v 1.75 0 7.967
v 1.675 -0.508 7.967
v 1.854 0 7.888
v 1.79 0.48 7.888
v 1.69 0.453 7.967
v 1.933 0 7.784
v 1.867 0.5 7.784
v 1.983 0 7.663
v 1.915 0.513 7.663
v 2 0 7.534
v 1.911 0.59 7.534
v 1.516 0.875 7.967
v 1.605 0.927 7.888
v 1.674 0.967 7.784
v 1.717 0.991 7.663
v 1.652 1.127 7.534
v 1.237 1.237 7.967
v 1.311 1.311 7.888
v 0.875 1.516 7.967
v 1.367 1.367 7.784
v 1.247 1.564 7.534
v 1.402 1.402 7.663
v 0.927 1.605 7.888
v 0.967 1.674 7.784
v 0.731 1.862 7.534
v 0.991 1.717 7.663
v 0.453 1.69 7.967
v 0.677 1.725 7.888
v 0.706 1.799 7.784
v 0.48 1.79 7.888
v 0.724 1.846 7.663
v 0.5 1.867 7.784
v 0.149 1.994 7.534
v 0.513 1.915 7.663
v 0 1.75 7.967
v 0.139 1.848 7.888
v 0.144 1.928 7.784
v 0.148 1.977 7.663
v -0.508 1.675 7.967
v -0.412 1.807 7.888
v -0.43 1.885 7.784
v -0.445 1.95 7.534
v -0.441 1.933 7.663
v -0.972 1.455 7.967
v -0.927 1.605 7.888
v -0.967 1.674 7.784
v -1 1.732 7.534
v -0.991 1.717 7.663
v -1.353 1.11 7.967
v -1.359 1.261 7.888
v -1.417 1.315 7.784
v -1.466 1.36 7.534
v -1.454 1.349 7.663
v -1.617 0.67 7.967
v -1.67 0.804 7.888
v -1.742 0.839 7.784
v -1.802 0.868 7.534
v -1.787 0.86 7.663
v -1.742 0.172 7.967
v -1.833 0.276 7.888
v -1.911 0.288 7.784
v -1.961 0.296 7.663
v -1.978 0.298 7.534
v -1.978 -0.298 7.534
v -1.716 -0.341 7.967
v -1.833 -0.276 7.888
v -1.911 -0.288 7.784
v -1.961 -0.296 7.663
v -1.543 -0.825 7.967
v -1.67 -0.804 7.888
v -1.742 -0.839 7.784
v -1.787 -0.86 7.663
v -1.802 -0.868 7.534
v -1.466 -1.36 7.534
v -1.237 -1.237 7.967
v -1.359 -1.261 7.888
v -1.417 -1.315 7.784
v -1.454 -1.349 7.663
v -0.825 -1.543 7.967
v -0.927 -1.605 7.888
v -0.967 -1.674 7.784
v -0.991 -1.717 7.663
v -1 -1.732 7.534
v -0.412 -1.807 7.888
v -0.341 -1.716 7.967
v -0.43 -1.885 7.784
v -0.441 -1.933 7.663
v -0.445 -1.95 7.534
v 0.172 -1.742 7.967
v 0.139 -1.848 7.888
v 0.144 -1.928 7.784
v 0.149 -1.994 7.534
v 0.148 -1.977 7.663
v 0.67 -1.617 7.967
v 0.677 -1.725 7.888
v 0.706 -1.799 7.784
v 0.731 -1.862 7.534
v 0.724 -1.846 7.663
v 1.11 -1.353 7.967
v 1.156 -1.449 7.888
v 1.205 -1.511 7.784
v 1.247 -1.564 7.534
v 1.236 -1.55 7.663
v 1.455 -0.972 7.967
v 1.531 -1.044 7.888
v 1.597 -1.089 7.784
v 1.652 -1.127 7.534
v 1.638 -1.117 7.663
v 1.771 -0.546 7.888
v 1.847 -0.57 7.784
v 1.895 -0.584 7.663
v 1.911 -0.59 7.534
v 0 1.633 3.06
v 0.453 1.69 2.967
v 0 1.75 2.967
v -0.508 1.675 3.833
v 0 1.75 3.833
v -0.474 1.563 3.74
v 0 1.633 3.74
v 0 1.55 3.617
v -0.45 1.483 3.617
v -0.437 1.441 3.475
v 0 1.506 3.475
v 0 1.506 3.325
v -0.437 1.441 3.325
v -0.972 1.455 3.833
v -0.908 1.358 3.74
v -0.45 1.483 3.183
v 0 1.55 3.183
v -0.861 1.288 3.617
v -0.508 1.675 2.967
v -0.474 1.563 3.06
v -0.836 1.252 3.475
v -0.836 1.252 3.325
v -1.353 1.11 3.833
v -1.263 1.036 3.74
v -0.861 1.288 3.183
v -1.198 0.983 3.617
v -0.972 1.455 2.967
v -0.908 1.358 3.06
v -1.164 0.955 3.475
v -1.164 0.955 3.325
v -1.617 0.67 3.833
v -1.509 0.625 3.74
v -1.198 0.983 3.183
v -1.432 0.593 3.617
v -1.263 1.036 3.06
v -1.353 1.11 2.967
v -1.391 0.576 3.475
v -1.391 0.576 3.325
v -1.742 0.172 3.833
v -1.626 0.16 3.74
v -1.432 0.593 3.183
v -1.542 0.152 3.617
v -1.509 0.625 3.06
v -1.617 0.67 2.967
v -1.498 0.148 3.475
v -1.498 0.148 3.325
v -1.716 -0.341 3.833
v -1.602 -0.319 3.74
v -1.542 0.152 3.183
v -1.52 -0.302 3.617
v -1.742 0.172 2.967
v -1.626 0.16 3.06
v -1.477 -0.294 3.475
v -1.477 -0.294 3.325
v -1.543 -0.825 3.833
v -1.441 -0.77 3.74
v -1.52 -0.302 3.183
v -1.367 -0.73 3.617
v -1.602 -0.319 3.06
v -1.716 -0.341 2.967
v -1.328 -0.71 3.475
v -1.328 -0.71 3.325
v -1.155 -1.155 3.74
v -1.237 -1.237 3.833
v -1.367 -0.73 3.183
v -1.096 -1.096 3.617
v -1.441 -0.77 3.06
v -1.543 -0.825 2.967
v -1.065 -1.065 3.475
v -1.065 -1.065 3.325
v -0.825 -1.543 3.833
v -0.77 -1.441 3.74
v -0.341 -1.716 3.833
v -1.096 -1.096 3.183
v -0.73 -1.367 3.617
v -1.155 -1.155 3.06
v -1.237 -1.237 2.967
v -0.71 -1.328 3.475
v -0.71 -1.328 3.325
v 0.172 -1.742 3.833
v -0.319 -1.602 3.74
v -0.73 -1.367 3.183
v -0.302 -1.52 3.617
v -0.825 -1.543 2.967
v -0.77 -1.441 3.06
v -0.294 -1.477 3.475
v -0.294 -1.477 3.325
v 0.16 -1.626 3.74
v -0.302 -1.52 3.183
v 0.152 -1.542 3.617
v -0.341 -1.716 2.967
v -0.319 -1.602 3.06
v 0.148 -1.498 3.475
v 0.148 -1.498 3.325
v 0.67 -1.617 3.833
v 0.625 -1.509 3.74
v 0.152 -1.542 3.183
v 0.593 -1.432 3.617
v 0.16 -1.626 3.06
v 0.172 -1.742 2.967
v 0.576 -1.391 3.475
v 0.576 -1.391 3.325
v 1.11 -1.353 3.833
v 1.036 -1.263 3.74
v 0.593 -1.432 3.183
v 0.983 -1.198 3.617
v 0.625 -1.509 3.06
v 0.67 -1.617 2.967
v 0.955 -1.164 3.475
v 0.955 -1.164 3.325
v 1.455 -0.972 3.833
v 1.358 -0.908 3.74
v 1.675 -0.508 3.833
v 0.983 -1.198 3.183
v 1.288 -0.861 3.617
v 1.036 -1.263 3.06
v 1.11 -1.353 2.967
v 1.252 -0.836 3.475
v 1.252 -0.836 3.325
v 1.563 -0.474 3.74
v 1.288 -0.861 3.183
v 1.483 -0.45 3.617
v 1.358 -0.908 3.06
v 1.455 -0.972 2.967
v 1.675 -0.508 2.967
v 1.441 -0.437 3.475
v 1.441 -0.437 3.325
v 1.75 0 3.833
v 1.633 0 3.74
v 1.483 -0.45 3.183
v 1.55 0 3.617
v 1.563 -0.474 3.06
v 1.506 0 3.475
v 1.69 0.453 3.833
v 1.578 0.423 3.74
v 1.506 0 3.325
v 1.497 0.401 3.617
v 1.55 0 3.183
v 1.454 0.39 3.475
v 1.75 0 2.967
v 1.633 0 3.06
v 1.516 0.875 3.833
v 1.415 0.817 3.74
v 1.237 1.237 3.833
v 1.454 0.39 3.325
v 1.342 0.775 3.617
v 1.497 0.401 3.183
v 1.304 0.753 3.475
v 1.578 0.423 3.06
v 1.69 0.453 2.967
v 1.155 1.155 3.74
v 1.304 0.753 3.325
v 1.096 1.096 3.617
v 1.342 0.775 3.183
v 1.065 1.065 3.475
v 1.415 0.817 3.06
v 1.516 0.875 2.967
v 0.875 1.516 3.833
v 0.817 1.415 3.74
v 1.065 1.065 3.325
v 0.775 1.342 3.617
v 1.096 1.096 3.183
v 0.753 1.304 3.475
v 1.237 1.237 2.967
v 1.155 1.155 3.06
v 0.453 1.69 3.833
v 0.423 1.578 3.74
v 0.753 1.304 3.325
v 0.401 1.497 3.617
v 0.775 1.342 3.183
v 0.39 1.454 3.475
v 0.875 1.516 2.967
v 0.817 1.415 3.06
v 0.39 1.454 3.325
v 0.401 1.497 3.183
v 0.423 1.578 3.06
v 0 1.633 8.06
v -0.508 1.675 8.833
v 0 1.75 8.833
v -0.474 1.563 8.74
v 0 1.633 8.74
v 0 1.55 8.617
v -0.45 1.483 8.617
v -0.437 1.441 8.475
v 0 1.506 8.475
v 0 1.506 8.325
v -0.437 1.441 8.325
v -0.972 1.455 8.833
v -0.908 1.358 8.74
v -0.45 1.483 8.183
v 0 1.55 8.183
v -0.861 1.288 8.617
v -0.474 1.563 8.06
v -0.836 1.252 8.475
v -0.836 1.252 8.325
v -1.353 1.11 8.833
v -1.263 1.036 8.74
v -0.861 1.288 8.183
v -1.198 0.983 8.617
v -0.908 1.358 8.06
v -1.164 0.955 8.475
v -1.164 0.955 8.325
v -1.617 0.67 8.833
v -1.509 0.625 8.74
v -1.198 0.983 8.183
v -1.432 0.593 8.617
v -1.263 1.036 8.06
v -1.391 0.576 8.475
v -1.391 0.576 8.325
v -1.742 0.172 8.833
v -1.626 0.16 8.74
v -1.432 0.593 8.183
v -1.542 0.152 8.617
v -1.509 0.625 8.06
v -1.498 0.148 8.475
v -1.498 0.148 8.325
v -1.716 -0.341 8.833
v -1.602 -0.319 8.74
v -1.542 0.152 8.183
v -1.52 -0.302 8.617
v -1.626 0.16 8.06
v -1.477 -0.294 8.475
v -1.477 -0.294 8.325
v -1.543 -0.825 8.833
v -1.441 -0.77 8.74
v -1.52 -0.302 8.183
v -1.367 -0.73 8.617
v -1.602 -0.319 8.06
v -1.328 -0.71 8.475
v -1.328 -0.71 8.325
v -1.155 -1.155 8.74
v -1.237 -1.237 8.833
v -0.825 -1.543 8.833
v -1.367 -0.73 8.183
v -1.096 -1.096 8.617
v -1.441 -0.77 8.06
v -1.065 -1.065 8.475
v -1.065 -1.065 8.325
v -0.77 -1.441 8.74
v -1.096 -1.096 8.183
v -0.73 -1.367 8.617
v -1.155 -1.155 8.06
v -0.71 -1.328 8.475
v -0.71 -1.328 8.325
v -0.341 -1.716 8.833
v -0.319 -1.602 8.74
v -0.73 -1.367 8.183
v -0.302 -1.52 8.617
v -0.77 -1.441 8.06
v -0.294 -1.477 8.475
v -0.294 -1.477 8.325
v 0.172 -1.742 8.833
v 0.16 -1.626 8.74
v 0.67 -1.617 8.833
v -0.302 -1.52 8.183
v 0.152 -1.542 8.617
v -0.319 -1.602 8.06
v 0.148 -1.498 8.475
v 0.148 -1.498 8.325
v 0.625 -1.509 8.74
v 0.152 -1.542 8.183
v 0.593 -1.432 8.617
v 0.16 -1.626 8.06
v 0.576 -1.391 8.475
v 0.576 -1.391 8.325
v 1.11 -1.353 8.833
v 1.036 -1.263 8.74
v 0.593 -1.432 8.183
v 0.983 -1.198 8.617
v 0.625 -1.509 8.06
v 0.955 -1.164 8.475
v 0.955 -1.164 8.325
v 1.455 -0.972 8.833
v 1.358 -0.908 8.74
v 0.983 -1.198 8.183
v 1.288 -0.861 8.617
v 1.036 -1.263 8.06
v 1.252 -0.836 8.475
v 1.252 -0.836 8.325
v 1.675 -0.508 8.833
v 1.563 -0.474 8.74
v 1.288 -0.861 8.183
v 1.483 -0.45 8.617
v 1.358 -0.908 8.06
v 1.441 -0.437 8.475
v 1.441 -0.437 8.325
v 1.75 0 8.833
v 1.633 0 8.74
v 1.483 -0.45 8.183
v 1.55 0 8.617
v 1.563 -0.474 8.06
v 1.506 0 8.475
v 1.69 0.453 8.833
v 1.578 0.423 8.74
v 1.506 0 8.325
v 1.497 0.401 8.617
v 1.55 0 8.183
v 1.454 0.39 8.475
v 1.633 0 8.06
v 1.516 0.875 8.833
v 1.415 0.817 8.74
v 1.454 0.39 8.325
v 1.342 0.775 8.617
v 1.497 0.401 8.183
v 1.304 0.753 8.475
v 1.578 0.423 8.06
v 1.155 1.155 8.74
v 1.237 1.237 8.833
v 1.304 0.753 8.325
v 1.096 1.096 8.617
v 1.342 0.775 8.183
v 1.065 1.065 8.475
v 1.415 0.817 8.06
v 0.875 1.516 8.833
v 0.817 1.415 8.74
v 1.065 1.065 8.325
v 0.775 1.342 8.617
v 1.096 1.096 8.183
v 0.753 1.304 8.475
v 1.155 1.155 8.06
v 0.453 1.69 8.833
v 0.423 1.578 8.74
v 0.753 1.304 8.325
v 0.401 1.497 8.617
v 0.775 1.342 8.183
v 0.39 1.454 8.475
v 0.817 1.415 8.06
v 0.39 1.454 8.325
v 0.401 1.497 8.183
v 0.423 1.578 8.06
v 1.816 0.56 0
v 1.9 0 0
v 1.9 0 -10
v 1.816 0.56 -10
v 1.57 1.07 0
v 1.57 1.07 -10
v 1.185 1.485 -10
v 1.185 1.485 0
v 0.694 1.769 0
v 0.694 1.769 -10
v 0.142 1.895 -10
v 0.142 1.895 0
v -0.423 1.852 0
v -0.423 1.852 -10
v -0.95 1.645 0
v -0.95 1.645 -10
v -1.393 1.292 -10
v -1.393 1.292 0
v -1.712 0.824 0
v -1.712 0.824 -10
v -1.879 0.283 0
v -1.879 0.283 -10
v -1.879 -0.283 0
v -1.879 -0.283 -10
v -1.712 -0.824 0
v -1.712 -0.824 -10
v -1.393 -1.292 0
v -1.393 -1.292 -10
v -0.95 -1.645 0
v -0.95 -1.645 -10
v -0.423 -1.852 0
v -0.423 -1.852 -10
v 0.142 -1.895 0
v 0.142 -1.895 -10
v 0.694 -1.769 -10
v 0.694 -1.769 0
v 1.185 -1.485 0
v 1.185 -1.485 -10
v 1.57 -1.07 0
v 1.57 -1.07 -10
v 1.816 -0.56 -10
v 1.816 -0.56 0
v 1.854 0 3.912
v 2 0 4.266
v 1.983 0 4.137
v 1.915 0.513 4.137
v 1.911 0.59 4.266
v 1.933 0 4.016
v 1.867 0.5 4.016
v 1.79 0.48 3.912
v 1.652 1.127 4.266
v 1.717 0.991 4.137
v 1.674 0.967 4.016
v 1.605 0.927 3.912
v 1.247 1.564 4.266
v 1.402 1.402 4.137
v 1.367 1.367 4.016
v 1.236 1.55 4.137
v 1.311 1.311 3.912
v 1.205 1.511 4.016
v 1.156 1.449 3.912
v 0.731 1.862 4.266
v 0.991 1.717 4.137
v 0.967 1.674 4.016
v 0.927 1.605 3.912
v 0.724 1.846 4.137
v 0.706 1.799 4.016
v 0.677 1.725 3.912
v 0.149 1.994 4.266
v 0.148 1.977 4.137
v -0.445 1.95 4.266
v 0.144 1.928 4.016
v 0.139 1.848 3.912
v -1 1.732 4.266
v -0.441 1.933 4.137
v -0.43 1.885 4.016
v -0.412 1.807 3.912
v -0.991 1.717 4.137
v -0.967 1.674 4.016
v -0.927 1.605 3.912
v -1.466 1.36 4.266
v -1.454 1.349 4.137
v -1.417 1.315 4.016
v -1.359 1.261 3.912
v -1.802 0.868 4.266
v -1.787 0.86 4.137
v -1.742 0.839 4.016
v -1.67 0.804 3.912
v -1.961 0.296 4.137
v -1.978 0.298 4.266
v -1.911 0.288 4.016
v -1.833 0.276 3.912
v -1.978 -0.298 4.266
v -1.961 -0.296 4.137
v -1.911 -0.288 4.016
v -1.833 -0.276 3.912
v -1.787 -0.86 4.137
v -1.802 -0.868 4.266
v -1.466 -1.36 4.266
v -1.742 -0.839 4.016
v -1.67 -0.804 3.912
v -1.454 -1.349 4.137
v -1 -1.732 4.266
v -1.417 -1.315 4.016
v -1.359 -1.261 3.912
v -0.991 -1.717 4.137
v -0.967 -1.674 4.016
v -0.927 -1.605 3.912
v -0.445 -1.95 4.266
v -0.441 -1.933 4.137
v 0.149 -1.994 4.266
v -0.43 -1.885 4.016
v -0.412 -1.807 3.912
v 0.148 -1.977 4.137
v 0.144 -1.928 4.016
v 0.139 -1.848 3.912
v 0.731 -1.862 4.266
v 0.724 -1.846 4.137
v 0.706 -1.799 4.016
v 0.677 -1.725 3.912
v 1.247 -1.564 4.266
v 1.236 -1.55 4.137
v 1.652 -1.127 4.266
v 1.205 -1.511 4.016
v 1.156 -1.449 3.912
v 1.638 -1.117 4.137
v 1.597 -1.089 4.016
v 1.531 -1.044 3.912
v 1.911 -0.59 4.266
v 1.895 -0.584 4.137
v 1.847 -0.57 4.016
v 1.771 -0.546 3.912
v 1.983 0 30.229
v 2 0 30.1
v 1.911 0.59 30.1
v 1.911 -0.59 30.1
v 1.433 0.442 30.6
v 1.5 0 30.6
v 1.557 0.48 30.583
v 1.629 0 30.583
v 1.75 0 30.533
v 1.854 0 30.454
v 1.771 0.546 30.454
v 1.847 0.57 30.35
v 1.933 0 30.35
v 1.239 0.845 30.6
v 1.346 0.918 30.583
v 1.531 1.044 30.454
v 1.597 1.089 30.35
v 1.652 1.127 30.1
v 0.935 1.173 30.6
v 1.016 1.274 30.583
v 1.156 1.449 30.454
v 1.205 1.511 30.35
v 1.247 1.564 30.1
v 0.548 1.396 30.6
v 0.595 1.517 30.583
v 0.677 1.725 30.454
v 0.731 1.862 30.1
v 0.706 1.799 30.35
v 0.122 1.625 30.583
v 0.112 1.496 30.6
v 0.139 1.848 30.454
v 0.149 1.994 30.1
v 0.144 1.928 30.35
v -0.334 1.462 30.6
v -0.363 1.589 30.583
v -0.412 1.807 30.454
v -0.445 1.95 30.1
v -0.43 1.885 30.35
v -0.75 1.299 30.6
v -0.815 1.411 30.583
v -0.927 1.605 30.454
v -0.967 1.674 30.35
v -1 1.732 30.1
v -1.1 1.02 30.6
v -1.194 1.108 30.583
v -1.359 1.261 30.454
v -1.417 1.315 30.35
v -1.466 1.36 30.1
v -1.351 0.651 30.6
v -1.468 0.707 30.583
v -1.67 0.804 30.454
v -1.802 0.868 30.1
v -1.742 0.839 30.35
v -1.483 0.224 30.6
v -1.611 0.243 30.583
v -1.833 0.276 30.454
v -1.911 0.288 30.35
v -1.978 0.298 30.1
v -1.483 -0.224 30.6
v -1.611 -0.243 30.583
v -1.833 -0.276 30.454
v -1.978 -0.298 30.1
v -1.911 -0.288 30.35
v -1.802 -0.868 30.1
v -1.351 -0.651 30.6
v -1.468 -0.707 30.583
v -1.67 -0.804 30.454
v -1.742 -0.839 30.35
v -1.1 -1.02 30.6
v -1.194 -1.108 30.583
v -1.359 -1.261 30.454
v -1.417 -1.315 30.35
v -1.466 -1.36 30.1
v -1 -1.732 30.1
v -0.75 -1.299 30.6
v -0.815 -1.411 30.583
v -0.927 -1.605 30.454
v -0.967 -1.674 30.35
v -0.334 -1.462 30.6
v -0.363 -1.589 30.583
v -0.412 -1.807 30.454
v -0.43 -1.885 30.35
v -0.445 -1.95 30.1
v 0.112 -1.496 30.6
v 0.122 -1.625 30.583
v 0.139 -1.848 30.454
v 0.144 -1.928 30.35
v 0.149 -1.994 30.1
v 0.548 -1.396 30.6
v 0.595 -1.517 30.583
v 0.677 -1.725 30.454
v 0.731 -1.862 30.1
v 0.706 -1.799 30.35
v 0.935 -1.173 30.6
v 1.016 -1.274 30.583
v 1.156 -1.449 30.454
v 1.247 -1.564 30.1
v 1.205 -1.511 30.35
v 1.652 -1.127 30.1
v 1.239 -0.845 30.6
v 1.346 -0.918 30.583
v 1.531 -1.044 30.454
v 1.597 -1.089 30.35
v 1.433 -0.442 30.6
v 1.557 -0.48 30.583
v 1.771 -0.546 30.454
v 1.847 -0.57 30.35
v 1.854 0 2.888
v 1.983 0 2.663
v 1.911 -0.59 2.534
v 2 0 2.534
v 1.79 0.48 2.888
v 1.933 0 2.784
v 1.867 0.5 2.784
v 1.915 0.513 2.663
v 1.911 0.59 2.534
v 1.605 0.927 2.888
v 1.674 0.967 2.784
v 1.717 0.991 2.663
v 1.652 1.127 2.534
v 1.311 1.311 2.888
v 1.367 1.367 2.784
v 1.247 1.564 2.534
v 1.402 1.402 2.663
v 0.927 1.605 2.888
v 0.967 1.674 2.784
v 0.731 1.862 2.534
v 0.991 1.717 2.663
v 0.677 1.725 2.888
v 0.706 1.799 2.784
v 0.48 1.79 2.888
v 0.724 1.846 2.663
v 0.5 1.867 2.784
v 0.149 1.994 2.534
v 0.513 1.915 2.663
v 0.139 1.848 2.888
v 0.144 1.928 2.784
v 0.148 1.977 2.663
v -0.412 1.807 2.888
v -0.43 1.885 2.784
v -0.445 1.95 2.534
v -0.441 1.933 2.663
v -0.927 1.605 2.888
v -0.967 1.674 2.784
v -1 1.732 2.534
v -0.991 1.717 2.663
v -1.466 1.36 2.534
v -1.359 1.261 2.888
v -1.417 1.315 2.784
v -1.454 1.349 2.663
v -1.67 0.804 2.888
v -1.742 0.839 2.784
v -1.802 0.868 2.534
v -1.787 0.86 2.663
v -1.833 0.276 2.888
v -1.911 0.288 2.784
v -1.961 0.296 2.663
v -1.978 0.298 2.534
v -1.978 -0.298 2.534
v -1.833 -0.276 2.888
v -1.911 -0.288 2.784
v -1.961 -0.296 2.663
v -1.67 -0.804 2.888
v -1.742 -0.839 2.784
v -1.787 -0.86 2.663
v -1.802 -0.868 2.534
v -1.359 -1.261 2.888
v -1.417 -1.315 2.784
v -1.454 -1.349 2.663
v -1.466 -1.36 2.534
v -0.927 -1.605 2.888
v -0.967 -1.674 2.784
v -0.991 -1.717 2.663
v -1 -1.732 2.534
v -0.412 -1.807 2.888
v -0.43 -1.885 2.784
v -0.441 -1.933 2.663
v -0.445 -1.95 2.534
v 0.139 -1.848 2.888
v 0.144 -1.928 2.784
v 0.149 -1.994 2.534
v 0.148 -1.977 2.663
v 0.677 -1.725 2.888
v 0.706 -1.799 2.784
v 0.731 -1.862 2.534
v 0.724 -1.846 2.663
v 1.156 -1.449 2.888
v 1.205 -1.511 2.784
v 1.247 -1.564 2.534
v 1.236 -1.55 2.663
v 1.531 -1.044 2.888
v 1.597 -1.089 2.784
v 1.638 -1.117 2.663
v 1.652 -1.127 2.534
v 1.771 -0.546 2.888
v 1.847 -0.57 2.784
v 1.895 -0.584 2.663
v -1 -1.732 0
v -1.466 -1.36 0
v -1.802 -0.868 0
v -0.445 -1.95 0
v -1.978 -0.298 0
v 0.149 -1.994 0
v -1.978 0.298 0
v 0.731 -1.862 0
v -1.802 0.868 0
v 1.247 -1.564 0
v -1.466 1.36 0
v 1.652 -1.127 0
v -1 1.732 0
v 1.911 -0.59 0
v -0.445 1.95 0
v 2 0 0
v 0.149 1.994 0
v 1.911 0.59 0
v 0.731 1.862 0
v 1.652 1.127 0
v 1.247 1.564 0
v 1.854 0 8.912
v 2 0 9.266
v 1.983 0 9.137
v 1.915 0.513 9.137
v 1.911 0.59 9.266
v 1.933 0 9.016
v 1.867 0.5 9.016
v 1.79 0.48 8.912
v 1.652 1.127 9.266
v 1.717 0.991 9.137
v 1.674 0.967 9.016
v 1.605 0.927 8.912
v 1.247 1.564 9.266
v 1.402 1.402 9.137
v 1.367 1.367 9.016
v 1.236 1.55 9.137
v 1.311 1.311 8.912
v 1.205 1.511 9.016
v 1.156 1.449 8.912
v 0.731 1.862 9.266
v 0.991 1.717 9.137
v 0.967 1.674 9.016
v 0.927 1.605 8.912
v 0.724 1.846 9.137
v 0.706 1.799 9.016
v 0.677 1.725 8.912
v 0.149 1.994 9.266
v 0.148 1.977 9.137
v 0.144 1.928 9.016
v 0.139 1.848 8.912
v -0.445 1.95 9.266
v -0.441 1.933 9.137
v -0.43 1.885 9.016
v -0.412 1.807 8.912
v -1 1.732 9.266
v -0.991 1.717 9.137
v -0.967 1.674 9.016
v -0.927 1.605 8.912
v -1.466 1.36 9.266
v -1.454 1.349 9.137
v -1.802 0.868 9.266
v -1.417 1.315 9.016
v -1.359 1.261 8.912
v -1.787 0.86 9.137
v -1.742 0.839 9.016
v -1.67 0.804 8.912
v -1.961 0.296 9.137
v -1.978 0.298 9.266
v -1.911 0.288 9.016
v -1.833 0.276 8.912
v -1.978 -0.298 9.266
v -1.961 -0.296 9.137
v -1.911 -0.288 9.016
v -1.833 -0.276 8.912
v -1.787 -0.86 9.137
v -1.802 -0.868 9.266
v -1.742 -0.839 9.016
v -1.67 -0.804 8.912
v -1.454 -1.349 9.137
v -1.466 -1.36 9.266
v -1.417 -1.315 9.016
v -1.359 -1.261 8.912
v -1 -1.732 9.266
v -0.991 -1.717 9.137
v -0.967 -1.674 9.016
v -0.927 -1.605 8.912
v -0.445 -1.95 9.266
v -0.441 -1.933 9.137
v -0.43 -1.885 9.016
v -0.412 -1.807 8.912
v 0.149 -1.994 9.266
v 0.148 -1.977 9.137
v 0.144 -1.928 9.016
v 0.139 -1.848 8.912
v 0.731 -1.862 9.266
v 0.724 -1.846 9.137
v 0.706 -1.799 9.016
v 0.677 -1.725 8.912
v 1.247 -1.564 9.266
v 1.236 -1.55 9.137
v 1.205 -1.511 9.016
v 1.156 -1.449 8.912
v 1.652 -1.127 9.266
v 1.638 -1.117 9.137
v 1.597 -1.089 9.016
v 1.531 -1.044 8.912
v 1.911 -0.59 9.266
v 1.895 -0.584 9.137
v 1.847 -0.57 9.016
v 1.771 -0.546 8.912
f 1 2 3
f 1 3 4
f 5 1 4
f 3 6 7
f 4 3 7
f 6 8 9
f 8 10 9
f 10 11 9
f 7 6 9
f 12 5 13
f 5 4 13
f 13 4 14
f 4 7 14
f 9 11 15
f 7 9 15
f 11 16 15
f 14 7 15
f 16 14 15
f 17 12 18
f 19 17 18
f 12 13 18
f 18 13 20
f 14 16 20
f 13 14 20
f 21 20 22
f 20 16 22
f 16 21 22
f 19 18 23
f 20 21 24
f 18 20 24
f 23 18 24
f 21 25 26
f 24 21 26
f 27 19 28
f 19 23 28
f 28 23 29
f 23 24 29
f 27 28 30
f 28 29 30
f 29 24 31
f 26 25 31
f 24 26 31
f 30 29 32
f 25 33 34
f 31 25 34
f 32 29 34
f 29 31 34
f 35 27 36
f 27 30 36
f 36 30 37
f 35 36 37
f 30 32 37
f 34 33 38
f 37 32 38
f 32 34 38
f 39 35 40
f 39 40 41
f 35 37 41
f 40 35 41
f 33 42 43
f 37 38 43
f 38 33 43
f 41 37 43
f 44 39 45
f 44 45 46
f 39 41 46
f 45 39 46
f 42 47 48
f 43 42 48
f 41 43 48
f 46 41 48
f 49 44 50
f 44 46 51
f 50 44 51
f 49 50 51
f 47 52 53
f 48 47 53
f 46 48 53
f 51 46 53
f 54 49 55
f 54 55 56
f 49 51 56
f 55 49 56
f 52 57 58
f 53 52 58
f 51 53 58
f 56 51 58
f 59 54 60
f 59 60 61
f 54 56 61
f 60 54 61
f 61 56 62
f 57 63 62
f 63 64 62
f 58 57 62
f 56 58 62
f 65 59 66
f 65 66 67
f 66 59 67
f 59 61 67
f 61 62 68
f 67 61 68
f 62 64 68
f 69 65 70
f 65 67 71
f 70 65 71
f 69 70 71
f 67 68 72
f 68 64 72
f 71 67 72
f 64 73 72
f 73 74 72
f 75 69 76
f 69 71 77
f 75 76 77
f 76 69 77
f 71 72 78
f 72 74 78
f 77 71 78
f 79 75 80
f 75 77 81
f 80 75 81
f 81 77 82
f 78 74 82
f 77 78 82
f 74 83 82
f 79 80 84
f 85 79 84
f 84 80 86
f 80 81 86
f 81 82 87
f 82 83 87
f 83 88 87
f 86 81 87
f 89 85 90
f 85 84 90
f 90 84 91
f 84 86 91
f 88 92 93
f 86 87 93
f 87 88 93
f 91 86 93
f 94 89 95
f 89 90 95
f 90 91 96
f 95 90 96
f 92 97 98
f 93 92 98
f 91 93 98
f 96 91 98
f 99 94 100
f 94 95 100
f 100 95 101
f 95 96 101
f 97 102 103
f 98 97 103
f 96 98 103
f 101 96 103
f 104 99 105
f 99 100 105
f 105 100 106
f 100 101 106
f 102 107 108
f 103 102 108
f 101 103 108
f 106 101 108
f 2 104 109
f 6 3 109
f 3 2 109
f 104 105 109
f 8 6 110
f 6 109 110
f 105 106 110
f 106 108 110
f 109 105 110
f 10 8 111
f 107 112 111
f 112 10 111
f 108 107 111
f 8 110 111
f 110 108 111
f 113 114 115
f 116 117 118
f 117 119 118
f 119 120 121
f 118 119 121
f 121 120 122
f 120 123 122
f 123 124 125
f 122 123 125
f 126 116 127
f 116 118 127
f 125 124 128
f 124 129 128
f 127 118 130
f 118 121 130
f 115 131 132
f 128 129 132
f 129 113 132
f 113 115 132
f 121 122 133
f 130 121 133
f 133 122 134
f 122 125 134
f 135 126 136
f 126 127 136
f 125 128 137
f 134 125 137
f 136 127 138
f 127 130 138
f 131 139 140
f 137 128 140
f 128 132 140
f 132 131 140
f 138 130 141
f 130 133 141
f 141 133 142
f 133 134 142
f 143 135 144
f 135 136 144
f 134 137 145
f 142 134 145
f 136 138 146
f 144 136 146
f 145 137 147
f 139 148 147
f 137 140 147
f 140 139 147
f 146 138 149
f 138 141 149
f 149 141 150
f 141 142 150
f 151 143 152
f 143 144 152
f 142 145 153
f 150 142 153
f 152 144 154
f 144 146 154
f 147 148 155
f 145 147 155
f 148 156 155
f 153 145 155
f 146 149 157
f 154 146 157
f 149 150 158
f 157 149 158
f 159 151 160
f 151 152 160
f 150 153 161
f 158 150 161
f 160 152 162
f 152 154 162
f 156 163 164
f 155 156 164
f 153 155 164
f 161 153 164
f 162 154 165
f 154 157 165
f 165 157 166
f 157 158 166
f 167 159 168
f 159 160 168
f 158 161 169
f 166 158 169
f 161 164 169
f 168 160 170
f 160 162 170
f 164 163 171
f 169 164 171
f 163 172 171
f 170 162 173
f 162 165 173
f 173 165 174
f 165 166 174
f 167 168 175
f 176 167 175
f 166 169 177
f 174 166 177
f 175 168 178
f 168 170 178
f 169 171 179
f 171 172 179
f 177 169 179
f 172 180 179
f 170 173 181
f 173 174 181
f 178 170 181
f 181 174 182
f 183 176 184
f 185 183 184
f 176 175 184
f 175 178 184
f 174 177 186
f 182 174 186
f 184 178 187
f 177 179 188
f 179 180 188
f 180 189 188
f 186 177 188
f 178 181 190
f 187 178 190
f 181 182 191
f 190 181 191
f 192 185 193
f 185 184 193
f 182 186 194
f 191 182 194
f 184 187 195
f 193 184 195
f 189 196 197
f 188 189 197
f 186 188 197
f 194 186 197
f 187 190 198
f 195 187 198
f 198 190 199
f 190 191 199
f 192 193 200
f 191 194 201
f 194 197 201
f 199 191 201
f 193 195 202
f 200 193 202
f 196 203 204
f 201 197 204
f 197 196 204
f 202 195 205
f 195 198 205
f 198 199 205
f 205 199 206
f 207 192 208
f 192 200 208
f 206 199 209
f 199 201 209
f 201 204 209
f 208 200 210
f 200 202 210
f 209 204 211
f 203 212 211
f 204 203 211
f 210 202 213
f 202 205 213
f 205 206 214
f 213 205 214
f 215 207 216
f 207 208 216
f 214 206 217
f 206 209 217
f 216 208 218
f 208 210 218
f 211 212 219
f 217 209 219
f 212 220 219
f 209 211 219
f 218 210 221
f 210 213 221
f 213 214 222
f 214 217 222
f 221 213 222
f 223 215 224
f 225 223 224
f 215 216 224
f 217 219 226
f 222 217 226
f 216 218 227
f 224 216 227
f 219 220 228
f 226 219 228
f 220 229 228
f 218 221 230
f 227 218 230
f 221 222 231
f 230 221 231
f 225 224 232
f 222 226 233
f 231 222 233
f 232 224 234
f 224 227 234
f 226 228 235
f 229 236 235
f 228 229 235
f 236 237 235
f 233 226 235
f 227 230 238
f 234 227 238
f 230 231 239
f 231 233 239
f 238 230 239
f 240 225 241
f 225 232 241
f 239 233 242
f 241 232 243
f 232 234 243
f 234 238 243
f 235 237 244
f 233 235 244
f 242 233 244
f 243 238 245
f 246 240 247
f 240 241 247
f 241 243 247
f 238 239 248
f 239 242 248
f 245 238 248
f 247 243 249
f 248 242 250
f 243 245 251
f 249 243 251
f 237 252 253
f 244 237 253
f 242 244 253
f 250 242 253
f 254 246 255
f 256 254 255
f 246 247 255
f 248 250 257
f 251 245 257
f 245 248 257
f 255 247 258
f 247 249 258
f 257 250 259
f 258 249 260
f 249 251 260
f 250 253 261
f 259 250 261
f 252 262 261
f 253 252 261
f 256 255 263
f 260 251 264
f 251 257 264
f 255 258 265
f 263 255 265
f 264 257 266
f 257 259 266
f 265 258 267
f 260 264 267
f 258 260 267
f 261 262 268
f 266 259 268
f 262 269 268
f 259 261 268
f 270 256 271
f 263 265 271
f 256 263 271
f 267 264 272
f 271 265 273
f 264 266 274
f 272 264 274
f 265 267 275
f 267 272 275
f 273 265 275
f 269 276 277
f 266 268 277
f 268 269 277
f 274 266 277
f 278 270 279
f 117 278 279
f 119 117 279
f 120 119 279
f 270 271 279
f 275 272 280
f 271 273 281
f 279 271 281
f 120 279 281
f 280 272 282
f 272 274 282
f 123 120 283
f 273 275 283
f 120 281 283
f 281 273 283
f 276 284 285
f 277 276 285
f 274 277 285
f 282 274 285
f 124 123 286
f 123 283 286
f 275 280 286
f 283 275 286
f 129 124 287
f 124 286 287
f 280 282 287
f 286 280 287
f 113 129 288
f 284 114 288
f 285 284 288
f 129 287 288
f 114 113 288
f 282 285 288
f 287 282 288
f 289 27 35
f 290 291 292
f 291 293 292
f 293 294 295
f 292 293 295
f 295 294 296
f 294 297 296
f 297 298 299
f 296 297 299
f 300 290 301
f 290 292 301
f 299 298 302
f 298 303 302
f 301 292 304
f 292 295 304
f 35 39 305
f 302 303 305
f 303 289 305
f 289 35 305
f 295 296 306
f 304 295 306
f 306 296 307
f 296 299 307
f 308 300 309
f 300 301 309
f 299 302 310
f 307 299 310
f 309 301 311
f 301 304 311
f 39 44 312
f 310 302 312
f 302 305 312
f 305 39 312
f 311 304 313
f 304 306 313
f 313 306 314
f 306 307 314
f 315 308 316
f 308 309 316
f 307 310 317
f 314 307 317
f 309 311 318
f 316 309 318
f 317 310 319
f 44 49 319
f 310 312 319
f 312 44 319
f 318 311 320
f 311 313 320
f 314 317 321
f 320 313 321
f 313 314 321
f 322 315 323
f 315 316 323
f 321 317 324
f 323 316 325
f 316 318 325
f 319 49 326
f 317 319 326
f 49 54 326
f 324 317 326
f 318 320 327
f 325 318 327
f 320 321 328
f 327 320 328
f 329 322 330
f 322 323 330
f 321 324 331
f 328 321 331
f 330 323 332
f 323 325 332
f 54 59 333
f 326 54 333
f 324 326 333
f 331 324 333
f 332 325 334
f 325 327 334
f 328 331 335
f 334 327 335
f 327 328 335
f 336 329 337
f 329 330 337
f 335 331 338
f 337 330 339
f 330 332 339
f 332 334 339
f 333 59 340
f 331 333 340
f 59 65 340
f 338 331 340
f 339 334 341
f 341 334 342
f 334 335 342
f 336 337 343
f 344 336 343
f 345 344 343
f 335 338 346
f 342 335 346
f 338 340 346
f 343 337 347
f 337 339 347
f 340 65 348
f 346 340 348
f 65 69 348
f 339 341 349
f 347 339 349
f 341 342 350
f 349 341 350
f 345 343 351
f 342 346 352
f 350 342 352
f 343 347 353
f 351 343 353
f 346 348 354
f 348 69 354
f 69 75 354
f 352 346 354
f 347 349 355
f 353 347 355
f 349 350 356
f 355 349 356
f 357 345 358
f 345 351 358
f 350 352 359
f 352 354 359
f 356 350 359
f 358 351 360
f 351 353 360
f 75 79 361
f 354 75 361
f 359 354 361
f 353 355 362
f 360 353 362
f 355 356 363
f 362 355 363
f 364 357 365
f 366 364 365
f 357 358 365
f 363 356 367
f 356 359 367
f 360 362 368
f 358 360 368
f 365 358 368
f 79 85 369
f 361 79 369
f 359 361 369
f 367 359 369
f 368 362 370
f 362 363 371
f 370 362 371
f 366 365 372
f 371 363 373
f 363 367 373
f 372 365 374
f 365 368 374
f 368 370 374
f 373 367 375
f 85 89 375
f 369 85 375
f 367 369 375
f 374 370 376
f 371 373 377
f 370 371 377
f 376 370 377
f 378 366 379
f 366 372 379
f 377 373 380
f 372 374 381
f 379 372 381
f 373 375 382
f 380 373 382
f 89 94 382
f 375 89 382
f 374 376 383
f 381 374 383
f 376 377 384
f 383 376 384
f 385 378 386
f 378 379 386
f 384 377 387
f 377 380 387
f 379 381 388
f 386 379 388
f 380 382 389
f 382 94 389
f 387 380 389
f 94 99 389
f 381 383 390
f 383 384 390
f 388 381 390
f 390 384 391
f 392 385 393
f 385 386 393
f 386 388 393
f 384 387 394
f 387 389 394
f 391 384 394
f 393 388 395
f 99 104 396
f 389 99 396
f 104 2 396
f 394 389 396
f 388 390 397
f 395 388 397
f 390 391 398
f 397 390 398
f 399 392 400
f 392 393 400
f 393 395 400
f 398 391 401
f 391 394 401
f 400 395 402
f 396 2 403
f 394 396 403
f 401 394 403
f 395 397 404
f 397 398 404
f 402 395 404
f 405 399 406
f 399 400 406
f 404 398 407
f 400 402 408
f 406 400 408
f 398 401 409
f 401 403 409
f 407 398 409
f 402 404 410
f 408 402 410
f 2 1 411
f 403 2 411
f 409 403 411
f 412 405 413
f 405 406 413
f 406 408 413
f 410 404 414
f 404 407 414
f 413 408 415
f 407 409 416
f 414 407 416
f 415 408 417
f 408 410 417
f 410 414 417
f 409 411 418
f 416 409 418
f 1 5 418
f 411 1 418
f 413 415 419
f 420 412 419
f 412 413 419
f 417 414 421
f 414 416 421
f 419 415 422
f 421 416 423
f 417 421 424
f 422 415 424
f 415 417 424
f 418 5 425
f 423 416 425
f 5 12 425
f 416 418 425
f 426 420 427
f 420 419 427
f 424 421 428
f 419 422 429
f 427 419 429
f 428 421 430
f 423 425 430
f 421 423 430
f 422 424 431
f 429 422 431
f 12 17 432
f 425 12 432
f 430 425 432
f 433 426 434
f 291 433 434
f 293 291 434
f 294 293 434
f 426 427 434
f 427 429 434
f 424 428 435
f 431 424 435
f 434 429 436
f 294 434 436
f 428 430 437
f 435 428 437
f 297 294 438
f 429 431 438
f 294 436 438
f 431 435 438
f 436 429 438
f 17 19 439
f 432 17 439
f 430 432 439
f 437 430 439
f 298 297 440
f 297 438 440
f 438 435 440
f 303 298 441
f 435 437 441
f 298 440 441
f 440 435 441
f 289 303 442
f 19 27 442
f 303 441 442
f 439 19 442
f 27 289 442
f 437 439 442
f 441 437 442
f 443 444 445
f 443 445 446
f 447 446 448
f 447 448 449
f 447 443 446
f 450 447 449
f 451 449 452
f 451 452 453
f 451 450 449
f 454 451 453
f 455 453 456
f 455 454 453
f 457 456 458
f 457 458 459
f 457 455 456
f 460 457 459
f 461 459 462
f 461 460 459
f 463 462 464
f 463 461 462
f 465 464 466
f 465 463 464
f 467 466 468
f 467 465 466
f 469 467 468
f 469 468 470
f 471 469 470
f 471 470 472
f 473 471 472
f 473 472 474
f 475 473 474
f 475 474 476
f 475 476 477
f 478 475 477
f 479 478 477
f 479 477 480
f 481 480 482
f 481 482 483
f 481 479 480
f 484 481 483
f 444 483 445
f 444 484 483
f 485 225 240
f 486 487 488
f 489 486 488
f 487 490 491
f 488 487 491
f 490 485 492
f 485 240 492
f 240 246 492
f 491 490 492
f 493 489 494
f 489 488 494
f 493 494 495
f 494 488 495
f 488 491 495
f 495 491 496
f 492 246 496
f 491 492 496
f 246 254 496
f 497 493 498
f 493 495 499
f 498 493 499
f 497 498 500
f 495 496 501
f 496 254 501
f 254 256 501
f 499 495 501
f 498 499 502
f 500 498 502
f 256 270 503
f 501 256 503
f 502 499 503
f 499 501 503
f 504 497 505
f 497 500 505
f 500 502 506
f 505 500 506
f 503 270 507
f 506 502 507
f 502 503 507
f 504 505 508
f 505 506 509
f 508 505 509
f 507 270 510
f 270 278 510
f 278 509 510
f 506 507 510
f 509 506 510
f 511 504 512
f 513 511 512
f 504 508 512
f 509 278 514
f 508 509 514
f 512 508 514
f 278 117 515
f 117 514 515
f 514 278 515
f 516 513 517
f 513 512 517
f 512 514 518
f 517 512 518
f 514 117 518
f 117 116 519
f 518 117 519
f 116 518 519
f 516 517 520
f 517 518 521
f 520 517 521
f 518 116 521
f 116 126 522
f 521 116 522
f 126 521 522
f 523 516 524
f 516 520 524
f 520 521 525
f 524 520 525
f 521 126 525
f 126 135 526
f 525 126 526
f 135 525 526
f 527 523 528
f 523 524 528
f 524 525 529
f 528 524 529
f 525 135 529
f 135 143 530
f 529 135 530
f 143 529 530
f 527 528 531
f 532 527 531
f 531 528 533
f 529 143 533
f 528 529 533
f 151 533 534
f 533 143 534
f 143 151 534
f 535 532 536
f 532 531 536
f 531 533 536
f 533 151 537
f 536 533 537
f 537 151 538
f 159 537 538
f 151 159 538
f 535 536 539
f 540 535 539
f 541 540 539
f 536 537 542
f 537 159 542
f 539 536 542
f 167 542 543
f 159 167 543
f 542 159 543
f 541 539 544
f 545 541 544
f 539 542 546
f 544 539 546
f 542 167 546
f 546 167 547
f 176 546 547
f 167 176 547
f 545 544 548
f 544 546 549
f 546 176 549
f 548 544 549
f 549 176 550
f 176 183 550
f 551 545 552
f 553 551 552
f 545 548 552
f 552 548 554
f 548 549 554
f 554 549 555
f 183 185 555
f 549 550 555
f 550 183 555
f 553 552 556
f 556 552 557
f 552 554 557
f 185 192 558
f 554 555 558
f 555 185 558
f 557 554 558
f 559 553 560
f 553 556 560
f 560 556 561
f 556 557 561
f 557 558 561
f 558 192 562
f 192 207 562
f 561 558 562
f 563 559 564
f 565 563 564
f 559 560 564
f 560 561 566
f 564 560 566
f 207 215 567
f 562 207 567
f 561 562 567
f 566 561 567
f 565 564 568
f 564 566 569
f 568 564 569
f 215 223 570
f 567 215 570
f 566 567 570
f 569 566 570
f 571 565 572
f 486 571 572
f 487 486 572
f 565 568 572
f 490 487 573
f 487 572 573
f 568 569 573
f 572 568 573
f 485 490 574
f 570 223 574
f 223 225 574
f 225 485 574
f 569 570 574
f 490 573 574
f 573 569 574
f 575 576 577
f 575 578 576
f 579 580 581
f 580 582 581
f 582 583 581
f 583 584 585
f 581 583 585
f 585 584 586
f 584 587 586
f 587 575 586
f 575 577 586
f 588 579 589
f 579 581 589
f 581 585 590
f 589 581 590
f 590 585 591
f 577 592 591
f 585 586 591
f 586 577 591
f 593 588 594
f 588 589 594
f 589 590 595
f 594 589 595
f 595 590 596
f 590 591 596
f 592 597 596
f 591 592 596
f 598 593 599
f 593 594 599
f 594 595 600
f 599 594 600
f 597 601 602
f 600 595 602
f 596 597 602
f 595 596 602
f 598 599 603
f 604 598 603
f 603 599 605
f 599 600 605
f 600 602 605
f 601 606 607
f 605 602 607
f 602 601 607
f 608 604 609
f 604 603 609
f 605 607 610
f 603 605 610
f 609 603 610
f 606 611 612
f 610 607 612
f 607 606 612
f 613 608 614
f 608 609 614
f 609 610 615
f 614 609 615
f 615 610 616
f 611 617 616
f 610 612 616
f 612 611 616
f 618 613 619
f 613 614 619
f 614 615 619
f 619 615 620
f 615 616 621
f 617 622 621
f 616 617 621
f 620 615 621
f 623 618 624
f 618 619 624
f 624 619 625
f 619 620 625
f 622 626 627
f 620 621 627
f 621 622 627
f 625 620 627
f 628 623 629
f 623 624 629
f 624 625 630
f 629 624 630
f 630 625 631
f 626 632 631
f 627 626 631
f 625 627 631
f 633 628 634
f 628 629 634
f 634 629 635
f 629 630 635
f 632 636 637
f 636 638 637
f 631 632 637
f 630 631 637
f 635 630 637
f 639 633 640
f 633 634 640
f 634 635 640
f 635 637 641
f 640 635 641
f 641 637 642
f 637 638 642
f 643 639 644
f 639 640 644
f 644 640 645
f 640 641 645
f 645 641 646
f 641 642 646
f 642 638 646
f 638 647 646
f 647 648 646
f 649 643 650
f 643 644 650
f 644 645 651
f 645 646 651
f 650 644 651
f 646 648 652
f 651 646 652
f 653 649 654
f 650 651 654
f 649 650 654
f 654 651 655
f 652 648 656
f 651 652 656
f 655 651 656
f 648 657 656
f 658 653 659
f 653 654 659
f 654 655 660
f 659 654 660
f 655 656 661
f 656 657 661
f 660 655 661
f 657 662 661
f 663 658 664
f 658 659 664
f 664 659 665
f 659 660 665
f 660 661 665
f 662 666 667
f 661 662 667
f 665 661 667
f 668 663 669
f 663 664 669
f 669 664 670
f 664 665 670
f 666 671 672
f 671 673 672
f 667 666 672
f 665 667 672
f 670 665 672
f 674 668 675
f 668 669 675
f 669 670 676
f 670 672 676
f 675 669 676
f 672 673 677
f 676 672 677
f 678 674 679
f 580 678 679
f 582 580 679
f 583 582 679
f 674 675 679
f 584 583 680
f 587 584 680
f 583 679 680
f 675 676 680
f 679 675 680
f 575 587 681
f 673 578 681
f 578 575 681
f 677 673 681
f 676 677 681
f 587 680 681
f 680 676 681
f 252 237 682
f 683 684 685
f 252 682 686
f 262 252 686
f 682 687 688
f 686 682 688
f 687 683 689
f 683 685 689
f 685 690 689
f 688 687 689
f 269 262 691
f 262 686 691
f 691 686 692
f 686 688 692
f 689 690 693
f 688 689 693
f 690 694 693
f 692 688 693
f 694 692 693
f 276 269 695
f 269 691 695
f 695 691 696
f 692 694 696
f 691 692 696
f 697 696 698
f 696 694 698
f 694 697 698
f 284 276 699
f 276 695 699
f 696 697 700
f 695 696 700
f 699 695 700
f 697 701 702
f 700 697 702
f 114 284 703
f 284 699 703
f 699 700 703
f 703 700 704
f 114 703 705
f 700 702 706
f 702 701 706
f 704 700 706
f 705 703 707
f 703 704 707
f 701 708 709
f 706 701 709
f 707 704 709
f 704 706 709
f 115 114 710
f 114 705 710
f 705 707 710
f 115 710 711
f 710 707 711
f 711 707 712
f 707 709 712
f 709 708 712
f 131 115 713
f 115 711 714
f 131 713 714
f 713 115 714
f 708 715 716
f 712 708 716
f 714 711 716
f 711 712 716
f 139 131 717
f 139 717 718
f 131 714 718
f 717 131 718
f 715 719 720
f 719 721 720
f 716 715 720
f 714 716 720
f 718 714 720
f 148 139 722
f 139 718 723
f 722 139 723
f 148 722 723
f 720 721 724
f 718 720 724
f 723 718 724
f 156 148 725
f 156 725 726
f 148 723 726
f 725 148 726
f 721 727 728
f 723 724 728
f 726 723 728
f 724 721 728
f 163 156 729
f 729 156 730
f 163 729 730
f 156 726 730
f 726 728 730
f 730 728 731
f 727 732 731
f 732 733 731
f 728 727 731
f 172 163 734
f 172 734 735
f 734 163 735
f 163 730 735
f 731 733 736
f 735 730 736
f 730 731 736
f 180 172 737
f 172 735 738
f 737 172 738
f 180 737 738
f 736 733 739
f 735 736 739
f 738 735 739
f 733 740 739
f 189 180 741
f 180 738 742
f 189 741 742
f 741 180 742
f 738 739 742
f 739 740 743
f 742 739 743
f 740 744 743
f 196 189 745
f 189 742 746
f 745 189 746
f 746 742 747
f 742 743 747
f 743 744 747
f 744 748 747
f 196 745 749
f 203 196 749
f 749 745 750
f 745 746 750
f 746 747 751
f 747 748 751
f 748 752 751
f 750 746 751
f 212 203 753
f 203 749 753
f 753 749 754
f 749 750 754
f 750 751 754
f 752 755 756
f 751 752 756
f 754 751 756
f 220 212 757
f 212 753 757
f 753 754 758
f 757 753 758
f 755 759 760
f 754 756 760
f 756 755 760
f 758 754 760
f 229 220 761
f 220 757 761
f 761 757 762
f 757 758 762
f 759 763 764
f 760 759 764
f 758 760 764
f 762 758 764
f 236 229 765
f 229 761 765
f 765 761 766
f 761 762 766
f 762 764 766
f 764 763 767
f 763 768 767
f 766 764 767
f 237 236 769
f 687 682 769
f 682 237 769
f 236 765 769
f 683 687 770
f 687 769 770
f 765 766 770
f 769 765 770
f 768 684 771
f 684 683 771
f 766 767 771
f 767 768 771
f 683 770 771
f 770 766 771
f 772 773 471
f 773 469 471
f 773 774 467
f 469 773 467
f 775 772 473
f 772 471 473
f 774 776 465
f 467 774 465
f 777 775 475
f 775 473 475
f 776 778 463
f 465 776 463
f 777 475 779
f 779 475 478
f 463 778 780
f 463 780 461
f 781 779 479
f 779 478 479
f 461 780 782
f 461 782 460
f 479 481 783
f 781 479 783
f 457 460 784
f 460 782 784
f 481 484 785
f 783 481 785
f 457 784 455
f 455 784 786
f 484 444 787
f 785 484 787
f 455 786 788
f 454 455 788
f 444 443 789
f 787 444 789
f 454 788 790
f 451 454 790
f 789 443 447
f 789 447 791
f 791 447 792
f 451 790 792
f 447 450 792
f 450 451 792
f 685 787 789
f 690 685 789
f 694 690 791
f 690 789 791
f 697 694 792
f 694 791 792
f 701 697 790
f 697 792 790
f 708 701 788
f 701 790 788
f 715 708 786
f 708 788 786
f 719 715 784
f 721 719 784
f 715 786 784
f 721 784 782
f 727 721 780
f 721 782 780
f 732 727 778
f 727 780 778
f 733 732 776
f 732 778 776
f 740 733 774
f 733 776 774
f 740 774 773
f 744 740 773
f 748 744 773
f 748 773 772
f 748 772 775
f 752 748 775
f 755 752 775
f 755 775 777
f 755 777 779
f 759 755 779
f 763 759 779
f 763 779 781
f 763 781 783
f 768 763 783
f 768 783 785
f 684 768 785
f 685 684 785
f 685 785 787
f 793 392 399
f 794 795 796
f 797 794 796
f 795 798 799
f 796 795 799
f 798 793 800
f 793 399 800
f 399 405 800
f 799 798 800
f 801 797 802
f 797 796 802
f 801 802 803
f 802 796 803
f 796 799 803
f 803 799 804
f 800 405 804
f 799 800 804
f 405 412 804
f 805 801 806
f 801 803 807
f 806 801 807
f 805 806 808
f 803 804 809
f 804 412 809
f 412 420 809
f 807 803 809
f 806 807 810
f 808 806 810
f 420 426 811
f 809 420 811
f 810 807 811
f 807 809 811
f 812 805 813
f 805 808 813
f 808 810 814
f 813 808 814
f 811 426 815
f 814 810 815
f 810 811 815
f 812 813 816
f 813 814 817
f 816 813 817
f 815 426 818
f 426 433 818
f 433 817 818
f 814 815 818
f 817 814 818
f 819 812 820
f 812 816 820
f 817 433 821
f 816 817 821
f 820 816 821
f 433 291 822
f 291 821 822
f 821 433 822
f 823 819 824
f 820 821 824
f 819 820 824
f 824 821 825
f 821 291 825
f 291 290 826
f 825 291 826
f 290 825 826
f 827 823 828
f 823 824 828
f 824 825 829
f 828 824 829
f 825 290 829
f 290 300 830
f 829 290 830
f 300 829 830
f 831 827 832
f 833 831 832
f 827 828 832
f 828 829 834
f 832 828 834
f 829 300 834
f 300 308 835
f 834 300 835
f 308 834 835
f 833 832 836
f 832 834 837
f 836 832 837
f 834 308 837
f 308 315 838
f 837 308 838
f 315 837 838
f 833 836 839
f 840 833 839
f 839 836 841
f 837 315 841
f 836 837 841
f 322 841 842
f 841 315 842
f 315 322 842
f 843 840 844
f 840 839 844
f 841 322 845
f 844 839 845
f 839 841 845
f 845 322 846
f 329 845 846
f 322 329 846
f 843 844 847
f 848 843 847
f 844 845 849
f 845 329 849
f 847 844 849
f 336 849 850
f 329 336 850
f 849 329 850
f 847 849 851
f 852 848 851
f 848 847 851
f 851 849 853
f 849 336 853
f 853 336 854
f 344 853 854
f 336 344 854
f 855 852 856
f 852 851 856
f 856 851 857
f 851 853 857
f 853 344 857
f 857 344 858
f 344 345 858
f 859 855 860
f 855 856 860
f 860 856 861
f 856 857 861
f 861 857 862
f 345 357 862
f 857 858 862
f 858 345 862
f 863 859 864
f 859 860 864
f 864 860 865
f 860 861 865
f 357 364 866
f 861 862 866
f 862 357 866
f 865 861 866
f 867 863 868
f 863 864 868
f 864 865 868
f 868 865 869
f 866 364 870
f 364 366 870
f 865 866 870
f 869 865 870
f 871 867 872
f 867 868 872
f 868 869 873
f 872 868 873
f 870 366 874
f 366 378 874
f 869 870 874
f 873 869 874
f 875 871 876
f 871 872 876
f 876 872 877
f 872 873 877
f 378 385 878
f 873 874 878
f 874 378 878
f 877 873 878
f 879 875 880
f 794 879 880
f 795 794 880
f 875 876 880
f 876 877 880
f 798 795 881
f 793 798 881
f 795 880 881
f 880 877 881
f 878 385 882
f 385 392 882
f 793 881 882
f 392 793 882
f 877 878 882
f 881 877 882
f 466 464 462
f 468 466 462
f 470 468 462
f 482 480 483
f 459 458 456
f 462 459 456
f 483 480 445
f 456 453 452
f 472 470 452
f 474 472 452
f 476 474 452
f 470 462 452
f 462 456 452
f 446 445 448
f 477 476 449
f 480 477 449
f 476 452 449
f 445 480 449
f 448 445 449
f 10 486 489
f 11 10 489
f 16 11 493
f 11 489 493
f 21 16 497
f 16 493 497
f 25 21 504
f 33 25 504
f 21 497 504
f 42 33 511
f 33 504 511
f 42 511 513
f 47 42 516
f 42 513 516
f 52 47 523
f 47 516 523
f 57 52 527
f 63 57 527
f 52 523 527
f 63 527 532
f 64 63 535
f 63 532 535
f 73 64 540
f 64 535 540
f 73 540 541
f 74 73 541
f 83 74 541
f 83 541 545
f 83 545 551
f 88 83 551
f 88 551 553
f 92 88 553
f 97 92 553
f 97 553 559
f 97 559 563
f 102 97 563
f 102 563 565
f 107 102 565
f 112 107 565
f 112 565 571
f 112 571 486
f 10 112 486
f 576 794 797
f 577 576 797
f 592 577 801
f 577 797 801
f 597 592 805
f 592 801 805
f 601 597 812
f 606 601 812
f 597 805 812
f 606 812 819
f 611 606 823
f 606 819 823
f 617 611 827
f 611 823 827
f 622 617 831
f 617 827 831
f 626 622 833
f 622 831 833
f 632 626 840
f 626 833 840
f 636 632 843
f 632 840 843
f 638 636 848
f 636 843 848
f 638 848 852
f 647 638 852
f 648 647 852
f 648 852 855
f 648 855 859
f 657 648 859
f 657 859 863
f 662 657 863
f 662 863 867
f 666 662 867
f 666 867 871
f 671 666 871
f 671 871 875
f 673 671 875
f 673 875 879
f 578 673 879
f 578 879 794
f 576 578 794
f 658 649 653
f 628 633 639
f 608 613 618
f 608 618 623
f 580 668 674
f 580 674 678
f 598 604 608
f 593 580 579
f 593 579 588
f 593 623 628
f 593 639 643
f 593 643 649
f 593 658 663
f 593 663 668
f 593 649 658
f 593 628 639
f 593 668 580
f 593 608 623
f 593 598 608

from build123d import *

# Parameters (mm, degrees)
SKETCH1_R           = 2
BOSS_EXTRUDE1_DEPTH = 30.6
SKETCH2_R           = 0.5
SKETCH3_R           = 1.9
BOSS_EXTRUDE2_DEPTH = 10


with BuildPart() as part:
    # Sketch1 → Boss-Extrude1 (new body)
    with BuildSketch(Plane.XY):
        Circle(SKETCH1_R)
    extrude(amount=BOSS_EXTRUDE1_DEPTH)

    # Sketch2 → Cut-Revolve1 (revolve, cut)
    with BuildSketch(Plane(origin=(0, 0, 0), x_dir=(0, 0, -1), z_dir=(1, 0, 0))):
        with Locations((-3.4, 2)):
            Circle(SKETCH2_R)
        with Locations((-8.4, 2)):
            Circle(SKETCH2_R)
    revolve(axis=Axis((0, 0, 0), (0, 0, 1)), mode=Mode.SUBTRACT)

    # Fillet1: read off the stored shape, not the designer's step
    # Fillet1 outline → Fillet1 (revolve, cut)
    with BuildSketch(Plane.XZ):
        with BuildLine():
            ThreePointArc((1.75, 2.966987298), (1.933012702, 2.783974596), (2, 2.533974596))
            Line((2, 2.533974596), (2, 2.966987298))
            Line((2, 2.966987298), (1.75, 2.966987298))
        make_face()
        with BuildLine():
            ThreePointArc((2, 4.266025404), (1.933012702, 4.016025404), (1.75, 3.833012702))
            Line((1.75, 3.833012702), (2, 3.833012702))
            Line((2, 3.833012702), (2, 4.266025404))
        make_face()
        with BuildLine():
            ThreePointArc((1.75, 7.966987298), (1.933012702, 7.783974596), (2, 7.533974596))
            Line((2, 7.533974596), (2, 7.966987298))
            Line((2, 7.966987298), (1.75, 7.966987298))
        make_face()
        with BuildLine():
            ThreePointArc((2, 9.266025404), (1.933012702, 9.016025404), (1.75, 8.833012702))
            Line((1.75, 8.833012702), (2, 8.833012702))
            Line((2, 8.833012702), (2, 9.266025404))
        make_face()
        with BuildLine():
            Line((2, 30.1), (2, 30.6))
            Line((2, 30.6), (1.5, 30.6))
            ThreePointArc((1.5, 30.6), (1.853553391, 30.453553391), (2, 30.1))
        make_face()
    revolve(axis=Axis((0, 0, 0), (0, 0, 1)), mode=Mode.SUBTRACT)

    # Sketch3 → Boss-Extrude2 (add)
    with BuildSketch(Plane.XY):
        Circle(SKETCH3_R)
    extrude(amount=-BOSS_EXTRUDE2_DEPTH)


solid = part.part
